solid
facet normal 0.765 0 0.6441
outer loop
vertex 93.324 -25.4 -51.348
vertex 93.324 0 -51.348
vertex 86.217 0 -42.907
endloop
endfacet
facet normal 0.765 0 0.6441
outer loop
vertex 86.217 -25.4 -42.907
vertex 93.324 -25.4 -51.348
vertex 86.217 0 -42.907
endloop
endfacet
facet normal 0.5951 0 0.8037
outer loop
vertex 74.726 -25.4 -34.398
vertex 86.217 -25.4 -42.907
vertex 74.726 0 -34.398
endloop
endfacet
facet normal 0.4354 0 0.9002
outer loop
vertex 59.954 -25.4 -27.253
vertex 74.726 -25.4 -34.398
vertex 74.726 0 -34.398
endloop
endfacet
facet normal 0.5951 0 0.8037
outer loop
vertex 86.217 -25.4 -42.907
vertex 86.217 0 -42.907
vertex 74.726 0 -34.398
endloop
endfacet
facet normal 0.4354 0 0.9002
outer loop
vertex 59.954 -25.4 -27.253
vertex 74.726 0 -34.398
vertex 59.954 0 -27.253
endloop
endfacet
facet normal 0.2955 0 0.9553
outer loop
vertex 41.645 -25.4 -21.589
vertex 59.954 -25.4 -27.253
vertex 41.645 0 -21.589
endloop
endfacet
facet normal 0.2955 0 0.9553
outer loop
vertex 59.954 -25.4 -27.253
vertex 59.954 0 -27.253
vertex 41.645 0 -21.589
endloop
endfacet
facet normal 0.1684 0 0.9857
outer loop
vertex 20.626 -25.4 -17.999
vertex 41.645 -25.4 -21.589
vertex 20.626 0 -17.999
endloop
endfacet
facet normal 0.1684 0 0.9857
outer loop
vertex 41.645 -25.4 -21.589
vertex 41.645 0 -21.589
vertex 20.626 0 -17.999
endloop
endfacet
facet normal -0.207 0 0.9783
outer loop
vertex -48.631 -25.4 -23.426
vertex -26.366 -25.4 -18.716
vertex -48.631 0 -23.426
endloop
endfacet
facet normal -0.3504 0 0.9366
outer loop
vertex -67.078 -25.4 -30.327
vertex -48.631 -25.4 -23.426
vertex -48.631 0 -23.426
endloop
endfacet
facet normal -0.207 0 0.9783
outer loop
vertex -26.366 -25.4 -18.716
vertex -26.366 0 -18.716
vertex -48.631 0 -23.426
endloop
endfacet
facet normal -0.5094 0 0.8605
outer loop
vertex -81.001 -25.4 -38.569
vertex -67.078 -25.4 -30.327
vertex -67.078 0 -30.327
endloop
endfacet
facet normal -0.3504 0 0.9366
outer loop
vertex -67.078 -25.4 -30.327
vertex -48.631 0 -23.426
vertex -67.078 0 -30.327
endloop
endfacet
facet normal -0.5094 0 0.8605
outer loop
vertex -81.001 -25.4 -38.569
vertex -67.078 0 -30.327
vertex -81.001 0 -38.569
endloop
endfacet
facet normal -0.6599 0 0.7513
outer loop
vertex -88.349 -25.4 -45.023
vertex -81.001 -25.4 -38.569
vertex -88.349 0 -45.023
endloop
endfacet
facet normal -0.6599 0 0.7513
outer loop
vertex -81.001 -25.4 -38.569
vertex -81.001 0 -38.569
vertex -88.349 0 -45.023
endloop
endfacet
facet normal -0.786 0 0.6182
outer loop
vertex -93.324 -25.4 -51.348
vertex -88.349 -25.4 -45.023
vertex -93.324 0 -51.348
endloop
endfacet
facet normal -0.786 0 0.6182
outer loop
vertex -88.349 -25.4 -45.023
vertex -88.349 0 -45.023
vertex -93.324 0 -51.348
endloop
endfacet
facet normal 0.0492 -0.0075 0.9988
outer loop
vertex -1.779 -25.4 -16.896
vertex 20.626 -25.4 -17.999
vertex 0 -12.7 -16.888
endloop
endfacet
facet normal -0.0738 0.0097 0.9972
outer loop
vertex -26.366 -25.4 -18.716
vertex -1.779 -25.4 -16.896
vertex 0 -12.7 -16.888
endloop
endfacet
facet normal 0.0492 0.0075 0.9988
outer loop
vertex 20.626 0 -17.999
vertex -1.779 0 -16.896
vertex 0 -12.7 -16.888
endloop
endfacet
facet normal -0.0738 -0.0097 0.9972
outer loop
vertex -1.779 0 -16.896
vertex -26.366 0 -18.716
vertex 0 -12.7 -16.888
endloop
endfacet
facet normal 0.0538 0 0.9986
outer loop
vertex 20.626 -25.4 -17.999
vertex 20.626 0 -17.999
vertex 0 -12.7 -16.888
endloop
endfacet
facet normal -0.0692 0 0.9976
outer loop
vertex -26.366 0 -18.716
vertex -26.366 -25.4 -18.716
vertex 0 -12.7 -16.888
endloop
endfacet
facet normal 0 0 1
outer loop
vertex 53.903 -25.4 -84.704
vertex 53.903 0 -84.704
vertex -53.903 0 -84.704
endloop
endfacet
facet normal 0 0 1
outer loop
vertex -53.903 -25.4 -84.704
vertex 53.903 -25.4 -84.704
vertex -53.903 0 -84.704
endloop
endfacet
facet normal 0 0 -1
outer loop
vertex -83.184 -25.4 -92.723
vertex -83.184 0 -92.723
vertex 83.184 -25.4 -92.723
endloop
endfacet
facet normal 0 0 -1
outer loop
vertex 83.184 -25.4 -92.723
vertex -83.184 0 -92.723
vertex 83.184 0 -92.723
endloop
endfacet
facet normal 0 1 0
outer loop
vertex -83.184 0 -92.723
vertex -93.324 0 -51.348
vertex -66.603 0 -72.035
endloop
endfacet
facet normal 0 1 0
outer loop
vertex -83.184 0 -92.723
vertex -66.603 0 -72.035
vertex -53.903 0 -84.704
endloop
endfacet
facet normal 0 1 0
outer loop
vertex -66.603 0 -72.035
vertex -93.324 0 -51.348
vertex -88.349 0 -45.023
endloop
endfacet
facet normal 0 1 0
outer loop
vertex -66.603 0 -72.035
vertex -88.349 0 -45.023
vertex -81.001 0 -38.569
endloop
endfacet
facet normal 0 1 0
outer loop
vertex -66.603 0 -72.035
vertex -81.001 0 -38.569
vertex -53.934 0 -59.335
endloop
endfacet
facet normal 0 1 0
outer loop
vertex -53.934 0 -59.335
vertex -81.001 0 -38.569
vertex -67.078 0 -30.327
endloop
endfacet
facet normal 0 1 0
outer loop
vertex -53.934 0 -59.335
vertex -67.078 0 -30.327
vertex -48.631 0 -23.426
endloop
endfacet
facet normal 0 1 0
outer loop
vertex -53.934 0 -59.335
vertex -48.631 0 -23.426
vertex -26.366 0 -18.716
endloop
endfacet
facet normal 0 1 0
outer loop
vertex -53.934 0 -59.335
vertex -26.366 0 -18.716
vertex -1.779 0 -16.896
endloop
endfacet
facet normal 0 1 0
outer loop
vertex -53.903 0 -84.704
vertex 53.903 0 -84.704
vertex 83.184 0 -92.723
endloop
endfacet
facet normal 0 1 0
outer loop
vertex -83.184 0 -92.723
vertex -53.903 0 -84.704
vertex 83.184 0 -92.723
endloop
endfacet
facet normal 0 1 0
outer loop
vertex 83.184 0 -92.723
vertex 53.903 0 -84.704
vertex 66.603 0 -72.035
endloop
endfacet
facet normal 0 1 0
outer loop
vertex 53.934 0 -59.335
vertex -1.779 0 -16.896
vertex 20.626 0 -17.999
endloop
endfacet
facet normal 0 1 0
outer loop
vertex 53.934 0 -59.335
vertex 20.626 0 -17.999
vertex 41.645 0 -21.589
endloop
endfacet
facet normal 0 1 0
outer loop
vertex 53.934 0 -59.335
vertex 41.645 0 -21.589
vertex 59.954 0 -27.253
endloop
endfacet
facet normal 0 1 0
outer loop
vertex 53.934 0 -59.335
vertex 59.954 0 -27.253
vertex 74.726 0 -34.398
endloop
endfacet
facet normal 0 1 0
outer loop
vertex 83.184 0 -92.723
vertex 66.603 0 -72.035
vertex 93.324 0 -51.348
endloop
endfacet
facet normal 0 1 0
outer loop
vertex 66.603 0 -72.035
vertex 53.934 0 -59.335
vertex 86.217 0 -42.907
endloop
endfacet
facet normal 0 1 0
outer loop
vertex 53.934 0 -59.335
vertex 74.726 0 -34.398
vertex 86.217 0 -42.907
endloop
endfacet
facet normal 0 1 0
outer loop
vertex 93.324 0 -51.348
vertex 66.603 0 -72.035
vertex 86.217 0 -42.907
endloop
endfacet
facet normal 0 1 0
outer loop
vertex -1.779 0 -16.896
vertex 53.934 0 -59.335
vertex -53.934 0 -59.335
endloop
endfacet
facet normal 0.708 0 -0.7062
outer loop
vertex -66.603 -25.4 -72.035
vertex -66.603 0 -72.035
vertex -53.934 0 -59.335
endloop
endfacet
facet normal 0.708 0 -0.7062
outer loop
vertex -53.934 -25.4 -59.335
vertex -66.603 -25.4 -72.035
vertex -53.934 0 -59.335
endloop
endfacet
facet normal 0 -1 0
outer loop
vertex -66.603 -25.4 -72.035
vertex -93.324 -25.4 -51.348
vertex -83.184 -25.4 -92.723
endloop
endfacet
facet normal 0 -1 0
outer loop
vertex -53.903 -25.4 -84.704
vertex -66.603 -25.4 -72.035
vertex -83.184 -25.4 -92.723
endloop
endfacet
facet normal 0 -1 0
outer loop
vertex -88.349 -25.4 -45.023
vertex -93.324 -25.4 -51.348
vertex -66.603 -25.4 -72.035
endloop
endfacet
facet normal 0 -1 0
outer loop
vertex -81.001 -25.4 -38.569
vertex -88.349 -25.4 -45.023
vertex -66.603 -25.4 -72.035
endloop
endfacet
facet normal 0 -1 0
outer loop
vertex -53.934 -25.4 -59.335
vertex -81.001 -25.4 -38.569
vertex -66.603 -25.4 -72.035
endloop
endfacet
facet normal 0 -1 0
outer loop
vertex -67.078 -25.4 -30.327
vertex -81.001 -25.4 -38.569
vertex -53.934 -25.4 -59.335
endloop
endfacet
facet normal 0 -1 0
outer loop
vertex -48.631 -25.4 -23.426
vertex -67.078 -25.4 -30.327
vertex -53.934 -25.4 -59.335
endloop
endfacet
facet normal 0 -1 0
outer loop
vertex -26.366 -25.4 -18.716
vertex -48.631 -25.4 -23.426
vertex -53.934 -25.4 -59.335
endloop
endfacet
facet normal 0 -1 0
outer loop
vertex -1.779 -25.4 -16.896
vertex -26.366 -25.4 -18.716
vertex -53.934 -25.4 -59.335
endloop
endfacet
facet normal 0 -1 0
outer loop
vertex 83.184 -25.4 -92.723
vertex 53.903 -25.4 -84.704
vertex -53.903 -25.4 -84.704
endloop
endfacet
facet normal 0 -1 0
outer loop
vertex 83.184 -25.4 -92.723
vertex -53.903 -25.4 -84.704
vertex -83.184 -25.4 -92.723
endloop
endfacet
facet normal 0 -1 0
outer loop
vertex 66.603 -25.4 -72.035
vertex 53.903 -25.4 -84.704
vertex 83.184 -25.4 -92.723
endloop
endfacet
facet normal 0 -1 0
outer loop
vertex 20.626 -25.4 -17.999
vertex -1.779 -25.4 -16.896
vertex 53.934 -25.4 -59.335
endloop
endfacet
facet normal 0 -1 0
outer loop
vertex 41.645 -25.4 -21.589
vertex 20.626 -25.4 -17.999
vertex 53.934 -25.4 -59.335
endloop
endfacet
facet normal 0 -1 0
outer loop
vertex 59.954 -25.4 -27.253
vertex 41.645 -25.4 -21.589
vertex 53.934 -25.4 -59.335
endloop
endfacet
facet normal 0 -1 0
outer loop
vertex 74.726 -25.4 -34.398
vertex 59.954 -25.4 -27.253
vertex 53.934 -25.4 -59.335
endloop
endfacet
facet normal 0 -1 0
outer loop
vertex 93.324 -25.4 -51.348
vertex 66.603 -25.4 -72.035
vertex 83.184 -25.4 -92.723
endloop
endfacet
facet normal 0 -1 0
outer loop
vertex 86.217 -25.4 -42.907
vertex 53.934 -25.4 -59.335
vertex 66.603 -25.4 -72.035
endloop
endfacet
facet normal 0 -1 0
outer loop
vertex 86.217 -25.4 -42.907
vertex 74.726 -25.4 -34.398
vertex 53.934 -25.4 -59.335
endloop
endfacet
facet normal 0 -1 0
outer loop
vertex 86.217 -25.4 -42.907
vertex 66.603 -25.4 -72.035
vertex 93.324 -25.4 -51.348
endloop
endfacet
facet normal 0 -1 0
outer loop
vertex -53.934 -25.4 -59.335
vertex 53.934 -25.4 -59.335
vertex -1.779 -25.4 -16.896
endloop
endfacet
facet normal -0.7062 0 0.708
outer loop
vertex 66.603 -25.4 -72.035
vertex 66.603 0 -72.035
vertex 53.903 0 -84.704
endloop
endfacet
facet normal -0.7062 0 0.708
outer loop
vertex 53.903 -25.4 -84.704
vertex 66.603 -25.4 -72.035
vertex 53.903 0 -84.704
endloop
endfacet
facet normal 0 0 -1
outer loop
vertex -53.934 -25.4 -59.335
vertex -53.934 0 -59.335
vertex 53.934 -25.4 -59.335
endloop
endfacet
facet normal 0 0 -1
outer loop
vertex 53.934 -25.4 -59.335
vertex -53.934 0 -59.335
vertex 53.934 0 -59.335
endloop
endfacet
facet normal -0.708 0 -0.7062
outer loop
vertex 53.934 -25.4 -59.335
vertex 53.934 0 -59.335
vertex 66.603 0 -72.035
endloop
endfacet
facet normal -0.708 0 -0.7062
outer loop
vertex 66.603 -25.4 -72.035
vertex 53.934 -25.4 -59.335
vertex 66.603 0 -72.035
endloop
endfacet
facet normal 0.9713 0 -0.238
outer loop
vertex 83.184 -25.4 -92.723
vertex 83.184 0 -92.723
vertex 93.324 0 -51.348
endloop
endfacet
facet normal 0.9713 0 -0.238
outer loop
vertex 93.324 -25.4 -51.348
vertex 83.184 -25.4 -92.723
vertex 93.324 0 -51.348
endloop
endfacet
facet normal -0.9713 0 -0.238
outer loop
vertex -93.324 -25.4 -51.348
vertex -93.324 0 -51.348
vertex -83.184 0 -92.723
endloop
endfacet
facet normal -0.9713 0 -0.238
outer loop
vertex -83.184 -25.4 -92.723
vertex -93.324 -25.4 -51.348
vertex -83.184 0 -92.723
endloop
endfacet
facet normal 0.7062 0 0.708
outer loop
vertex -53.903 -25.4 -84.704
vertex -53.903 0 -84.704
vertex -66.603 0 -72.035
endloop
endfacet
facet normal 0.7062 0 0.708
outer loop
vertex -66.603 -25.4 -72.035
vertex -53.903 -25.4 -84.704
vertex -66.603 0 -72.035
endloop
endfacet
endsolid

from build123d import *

# Parameters (mm, degrees)
F2_DEPTH = 25.4


with BuildPart() as f2:
    # F1 (on Front) → F2 (new body)
    with BuildSketch(Plane.XZ):
        with BuildLine():
            Line((83.1839653551, -92.7227025355), (93.3241924209, -51.3479548737))
            add(Edge.make_bspline(
                [(93.3241924209, -51.3479548737), (0, 95.9786721212), (-93.3241924209, -51.3479548737)],
                knots=[0.3102753039, 0.3102753039, 0.3102753039, 2.8313173497, 2.8313173497, 2.8313173497], degree=2, weights=[1, 0.3053208061, 1]))
            Line((-93.3241924209, -51.3479548737), (-83.1839653551, -92.7227025355))
            Line((-83.1839653551, -92.7227025355), (83.1839653551, -92.7227025355))
        make_face()
        Polygon((-66.6030276888, -72.0353287046), (-53.9340679584, -59.3353666377), (47.827086872, -59.3353666377), (53.9340679584, -59.3353666377), (66.6030276888, -72.0353287046), (53.9030656219, -84.704288435), (47.8580892086, -84.704288435), (-53.9030656219, -84.704288435), align=None, mode=Mode.SUBTRACT)
    extrude(amount=F2_DEPTH)


solid = f2.part
